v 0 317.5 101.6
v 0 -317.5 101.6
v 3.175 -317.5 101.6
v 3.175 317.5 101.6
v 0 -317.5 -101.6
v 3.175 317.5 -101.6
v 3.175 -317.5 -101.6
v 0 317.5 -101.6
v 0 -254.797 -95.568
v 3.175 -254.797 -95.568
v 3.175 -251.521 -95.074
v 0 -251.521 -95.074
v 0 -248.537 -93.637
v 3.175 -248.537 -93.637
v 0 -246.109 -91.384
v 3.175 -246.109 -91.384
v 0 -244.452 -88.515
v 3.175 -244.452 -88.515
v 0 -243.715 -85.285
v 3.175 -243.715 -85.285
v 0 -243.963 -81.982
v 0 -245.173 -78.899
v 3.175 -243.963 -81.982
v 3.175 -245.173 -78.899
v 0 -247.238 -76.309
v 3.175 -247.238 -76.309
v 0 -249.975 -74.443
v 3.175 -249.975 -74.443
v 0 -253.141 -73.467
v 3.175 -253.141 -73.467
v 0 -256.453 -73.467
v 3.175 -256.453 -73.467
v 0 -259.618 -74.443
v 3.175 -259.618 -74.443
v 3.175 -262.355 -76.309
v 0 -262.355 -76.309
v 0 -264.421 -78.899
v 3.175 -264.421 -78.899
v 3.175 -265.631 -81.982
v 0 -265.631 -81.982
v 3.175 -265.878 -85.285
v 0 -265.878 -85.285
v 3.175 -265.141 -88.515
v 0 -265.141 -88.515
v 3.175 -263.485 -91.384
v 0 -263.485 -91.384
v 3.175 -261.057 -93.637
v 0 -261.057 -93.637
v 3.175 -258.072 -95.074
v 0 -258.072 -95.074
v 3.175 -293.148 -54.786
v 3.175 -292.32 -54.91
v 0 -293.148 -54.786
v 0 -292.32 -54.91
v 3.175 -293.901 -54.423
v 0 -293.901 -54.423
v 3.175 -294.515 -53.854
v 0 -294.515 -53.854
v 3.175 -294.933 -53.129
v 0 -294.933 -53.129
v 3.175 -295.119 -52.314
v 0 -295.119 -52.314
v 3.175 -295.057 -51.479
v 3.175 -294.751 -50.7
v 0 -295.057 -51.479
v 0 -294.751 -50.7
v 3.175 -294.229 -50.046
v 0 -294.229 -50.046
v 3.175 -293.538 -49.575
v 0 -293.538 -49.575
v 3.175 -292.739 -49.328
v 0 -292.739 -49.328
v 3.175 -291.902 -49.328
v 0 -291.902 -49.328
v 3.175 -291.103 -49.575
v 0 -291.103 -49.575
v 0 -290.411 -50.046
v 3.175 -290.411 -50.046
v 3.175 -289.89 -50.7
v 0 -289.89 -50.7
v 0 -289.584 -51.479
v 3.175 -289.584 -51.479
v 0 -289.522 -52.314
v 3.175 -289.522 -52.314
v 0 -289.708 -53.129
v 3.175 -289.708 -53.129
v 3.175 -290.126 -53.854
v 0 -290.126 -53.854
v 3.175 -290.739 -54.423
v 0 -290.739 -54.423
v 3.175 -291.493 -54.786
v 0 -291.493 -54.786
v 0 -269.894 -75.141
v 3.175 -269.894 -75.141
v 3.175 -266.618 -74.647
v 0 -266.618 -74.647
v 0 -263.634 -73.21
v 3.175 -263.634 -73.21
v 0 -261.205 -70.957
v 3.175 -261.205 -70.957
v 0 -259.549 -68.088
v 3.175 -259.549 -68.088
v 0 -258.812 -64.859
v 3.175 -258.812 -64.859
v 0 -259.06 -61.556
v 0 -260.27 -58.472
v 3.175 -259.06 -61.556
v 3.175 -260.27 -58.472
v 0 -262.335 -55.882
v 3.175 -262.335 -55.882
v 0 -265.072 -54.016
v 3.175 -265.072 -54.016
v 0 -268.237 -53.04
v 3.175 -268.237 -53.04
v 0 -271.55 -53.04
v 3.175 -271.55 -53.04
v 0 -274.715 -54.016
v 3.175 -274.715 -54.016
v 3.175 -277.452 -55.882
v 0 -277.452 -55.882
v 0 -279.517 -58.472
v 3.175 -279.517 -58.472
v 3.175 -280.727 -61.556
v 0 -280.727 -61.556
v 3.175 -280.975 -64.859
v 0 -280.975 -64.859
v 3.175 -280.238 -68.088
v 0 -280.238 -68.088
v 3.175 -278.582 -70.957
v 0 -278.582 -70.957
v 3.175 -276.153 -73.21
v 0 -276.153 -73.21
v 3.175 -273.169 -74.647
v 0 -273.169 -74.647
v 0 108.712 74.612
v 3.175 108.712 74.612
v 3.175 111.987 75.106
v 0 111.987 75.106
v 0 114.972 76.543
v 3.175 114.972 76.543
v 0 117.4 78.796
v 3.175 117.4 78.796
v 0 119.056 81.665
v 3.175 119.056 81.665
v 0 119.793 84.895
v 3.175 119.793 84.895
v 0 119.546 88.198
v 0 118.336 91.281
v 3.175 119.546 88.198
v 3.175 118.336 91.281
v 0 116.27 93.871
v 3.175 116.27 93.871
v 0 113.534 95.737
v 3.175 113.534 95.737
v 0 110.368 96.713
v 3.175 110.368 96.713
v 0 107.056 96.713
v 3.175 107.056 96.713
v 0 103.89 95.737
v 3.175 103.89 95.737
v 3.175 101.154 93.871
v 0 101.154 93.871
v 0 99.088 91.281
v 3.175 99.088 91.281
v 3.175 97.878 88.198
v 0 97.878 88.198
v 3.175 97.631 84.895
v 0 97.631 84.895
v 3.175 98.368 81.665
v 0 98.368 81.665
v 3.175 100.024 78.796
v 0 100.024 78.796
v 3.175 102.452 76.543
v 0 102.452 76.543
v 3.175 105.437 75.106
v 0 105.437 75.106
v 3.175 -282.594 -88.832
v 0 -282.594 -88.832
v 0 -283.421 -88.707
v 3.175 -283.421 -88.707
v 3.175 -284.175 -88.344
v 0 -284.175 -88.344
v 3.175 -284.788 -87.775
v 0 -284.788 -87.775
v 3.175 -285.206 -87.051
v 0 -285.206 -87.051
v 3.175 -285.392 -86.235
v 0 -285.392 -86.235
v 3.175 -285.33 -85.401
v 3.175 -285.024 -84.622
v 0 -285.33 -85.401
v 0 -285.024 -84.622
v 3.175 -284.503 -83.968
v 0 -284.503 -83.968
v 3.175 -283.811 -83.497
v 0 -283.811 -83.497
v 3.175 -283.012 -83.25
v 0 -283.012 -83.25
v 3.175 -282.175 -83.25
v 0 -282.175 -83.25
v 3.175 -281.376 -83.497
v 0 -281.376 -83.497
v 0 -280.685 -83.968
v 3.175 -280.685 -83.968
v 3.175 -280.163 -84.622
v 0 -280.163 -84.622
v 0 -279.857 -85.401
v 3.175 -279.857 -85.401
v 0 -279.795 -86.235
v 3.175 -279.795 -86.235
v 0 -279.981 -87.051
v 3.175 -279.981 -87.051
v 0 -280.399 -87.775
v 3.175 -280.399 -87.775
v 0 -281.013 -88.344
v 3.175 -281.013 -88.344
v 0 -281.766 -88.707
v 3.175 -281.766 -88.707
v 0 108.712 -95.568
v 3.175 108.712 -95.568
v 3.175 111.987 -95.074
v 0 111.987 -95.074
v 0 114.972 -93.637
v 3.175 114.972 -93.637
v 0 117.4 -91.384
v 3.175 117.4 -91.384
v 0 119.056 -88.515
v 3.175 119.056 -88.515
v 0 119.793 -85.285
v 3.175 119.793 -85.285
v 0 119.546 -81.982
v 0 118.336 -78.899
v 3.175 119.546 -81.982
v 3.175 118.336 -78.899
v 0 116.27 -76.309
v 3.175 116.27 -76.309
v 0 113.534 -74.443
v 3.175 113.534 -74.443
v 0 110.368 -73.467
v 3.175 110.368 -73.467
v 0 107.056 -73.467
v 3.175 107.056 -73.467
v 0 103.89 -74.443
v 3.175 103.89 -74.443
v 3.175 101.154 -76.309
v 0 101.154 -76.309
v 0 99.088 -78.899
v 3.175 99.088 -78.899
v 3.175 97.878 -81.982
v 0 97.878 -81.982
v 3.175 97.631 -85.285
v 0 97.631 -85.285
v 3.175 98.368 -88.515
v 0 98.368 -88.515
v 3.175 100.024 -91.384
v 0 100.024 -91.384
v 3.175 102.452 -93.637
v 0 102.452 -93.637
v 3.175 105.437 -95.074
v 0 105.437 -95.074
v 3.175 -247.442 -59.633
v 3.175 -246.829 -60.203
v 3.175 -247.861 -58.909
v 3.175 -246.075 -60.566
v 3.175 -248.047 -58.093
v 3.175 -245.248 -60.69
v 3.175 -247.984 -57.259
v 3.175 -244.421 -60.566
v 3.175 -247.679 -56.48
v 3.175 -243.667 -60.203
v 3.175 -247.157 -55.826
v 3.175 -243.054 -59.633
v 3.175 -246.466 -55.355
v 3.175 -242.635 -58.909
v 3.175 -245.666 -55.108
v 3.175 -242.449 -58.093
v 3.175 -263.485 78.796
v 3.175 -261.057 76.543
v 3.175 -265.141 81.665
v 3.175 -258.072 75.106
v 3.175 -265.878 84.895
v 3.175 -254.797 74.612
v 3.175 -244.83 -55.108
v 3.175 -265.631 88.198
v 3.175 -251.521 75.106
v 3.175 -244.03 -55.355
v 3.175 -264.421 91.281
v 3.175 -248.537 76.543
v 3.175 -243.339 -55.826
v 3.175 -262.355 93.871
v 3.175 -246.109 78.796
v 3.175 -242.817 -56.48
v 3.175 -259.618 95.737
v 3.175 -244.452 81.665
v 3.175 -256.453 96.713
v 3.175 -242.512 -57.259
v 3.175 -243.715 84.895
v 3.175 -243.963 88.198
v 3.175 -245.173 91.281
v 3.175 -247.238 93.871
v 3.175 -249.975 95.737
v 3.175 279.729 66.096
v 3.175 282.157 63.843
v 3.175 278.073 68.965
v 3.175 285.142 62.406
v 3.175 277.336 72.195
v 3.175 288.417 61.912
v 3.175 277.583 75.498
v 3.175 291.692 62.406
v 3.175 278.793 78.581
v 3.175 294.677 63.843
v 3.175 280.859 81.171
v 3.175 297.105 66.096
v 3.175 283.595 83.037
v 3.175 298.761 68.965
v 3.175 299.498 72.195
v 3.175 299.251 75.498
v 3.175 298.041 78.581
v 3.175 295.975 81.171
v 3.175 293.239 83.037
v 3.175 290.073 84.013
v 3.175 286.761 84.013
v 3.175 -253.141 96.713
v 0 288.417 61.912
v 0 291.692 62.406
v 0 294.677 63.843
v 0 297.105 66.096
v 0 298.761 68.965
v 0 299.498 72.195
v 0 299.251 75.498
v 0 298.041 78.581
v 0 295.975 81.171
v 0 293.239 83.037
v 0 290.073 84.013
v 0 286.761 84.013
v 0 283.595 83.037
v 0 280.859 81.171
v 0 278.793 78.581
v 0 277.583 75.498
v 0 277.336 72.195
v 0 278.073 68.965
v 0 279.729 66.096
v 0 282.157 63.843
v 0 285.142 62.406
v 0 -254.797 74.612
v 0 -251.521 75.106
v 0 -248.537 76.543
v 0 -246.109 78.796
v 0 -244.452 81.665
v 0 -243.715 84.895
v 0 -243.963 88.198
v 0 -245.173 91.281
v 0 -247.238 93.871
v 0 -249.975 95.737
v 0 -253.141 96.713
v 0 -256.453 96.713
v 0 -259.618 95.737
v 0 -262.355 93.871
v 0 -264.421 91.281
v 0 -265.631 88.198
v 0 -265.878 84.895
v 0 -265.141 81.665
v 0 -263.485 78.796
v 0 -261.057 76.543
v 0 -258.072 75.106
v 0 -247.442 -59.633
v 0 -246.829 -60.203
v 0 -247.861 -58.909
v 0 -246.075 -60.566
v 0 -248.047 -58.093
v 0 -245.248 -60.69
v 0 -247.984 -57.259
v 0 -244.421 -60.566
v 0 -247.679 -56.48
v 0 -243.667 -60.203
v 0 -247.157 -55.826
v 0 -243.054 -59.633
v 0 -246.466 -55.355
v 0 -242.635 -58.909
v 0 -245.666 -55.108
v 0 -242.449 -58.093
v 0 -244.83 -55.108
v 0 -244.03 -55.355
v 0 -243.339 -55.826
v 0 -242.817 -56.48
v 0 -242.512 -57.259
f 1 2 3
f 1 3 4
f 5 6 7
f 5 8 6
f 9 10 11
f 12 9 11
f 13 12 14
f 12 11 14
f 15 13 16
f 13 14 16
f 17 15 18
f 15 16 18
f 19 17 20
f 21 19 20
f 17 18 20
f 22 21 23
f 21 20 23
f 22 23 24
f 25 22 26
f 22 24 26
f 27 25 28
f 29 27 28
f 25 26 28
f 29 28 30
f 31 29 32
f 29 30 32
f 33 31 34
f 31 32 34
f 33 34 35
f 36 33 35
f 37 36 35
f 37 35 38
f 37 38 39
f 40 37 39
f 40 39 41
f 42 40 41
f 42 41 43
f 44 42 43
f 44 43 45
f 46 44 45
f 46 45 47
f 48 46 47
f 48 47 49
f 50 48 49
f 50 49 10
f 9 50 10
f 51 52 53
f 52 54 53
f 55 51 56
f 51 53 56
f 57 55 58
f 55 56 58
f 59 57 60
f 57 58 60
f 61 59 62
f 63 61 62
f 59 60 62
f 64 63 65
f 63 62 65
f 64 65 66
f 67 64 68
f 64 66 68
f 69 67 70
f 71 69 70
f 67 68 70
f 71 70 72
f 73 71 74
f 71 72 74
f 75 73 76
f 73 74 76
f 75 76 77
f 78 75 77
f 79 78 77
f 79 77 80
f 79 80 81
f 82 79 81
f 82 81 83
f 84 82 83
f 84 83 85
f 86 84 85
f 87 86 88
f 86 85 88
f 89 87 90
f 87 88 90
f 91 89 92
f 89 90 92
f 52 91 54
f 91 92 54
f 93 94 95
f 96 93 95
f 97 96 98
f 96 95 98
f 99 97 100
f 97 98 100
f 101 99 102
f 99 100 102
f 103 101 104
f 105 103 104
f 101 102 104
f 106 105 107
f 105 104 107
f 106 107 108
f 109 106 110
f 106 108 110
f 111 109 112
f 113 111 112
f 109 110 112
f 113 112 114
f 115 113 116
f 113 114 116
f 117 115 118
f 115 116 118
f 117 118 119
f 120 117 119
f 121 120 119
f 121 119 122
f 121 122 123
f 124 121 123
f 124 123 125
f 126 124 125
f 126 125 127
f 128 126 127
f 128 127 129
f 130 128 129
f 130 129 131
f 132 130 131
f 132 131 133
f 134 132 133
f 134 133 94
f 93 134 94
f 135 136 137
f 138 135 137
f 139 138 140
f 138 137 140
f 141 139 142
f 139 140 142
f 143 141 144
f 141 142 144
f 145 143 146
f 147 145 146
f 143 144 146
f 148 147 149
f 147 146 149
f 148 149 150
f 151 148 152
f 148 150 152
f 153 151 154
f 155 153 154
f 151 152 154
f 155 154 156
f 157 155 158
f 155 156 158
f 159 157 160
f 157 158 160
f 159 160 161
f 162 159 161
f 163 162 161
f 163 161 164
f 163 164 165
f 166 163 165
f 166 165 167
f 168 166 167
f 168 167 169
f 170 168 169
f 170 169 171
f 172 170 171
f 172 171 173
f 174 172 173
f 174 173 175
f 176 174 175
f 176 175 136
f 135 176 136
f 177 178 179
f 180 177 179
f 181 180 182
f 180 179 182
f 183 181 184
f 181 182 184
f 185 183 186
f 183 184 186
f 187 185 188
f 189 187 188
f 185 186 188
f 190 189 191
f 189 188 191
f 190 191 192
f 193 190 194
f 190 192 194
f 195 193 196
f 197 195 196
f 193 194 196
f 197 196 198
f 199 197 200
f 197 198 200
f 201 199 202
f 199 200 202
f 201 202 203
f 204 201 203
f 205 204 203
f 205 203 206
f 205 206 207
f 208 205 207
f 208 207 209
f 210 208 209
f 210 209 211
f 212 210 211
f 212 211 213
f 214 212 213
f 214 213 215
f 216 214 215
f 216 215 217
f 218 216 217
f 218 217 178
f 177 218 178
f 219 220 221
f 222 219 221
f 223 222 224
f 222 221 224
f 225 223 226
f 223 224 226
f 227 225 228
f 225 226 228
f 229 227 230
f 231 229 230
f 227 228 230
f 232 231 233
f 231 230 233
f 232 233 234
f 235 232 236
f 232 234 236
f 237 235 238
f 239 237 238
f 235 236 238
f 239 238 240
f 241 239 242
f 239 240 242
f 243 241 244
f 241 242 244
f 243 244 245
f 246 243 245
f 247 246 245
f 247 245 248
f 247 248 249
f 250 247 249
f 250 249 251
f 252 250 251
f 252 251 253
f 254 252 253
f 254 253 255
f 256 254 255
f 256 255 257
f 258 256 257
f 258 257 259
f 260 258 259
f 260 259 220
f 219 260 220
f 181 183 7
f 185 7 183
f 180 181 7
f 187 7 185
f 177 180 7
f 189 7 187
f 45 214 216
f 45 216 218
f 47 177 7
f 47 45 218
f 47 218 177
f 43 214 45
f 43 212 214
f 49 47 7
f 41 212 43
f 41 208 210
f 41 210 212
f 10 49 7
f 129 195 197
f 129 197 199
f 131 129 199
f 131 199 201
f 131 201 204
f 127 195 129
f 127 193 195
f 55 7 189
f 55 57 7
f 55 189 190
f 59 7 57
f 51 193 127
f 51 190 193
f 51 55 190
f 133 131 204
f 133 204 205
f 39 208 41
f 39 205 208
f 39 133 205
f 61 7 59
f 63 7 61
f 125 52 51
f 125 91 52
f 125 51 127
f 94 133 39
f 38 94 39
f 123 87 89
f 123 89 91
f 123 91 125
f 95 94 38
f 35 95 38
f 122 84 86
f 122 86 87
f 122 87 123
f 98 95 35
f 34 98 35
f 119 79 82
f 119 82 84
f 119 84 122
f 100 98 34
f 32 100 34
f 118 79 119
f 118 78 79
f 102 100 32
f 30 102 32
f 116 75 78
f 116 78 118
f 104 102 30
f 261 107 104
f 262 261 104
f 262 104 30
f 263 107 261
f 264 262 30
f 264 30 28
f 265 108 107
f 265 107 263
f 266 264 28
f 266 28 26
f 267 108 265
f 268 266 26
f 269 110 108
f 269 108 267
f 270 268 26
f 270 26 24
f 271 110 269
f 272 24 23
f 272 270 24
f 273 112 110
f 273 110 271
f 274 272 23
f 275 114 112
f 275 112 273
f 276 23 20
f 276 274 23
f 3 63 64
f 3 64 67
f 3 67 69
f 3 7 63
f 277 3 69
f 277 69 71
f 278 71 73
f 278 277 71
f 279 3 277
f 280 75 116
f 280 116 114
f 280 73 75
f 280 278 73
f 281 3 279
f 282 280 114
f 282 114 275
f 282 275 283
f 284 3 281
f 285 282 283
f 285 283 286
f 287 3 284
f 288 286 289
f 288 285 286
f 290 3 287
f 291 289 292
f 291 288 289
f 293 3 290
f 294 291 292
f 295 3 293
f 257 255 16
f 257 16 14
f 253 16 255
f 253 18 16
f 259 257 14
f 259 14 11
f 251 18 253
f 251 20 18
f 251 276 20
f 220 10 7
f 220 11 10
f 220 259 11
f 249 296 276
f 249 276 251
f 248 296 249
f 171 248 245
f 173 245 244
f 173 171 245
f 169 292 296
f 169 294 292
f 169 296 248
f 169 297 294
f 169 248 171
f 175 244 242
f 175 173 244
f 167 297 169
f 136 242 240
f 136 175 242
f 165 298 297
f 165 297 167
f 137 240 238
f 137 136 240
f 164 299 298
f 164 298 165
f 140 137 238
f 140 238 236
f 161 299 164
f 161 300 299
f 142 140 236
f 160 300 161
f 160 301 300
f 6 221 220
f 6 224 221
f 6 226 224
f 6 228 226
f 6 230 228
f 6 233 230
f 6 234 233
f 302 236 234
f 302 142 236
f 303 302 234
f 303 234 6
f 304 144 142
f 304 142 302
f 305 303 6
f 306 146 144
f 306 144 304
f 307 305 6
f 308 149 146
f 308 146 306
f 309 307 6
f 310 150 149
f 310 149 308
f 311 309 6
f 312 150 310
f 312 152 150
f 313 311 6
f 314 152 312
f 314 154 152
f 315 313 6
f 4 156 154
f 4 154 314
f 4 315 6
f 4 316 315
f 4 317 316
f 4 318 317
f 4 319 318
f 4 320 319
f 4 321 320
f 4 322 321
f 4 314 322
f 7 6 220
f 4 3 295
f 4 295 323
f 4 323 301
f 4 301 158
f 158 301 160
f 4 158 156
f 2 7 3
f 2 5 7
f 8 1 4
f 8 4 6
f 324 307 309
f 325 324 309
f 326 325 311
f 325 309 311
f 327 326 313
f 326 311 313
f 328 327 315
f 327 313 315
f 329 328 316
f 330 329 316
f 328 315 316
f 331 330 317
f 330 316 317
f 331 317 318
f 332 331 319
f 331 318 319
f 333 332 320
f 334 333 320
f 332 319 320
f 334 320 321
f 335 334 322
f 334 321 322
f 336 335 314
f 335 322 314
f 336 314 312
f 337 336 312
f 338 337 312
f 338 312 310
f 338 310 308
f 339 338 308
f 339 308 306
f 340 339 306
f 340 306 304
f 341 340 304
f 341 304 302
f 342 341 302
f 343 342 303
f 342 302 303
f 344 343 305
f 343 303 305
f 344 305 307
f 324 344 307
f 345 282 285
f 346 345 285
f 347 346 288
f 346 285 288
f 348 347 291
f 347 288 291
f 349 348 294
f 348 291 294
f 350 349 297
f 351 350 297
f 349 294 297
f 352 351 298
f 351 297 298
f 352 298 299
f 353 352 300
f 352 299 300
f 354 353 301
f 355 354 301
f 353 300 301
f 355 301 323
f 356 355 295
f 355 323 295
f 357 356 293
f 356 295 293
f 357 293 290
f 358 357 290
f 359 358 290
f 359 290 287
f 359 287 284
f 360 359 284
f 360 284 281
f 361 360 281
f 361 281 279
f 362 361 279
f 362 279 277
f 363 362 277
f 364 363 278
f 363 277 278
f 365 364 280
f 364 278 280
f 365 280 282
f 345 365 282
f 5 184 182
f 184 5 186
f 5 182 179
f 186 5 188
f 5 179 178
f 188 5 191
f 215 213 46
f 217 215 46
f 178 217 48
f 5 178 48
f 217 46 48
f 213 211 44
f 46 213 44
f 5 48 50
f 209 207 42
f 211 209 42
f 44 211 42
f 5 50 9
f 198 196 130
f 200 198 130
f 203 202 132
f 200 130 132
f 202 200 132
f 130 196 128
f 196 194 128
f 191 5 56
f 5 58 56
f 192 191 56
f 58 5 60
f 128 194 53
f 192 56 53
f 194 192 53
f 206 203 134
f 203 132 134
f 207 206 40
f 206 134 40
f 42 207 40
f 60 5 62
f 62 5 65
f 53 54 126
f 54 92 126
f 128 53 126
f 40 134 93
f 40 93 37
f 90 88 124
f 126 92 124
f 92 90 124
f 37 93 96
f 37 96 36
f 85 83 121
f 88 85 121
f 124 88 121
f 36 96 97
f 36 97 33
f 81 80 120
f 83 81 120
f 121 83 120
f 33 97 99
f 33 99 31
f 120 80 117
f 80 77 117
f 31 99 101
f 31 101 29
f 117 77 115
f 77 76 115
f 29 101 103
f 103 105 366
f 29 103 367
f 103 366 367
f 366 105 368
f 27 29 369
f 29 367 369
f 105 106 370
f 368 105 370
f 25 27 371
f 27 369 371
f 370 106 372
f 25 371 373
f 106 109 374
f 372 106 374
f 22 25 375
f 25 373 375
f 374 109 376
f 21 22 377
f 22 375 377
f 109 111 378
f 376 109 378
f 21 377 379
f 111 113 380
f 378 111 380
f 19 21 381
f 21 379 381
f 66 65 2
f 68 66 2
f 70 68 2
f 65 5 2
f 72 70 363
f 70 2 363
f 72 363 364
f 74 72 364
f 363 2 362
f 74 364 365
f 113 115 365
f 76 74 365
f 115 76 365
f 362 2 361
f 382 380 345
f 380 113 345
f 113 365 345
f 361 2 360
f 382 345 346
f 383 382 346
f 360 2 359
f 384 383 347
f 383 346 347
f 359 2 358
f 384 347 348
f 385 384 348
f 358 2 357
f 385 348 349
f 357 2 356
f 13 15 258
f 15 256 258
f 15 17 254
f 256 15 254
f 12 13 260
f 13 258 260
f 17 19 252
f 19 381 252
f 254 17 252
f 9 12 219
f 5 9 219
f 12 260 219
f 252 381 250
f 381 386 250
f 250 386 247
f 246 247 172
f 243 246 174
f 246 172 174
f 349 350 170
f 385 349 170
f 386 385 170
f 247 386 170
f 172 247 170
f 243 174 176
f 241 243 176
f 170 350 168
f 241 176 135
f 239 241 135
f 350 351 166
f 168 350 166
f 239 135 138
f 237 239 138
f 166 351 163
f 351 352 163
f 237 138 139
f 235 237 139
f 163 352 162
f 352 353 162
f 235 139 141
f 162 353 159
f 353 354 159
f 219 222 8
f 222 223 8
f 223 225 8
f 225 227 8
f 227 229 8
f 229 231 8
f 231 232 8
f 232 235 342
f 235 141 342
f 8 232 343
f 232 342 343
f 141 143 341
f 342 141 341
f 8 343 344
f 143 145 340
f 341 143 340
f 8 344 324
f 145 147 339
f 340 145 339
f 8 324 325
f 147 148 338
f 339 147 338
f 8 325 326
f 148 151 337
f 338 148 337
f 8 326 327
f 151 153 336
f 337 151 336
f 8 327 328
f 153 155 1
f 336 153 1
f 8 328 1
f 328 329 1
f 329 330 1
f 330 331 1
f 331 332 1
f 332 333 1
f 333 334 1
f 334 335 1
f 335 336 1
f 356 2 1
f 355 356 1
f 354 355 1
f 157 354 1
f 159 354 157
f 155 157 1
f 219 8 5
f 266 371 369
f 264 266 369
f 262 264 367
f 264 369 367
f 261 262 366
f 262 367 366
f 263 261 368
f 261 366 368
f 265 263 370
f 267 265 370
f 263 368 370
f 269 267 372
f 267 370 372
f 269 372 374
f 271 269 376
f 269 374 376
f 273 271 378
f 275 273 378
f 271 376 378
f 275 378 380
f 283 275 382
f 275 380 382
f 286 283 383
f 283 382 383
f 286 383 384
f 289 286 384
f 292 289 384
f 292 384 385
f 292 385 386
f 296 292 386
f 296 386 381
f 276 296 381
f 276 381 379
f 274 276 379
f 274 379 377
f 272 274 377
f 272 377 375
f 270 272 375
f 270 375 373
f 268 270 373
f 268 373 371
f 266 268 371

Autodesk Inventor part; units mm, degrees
ref_plane "YZ Plane" through (0, 0, 0) normal (1, 0, 0) x (0, 1, 0)
ref_plane "XZ Plane" through (0, 0, 0) normal (0, 1, 0) x (-1, 0, 0)
ref_plane "XY Plane" through (0, 0, 0) normal (0, 0, 1) x (1, 0, 0)
sketch "Sketch1" plane through (0, 0, 0) normal (1, 0, 0) x (0, 1, 0)
  line L0 (-317.5, 101.6) -> (317.5, 101.6)
  line L1 (317.5, 101.6) -> (317.5, -101.6)
  line L2 (317.5, -101.6) -> (-317.5, -101.6)
  line L3 (-317.5, -101.6) -> (-317.5, 101.6)
  line L4 (-317.5, 101.6) -> (317.5, -101.6) construction
  line L5 (317.5, 101.6) -> (-317.5, -101.6) construction
  point P0 (0, 0)
  dimension "d0" = 635
  dimension "d1" = 203.2
extrude "Plate1" add sketch "Sketch1" along normal blind 3.175
sketch "Sketch2" plane through (3.175, 0, 0) normal (1, 0, 0) x (0, 0, -1)
  circle A0 centre (-85.725, -254.7968) radius 11.1125
  circle A1 centre (84.455, -254.7968) radius 11.1125
  circle A2 centre (-85.725, 108.712) radius 11.1125
  circle A3 centre (84.455, 108.712) radius 11.1125
  circle A4 centre (-85.725, -254.7968) radius 11.938 construction
  circle A5 centre (84.455, -254.7968) radius 11.938 construction
  circle A6 centre (84.455, 108.712) radius 11.938 construction
  circle A7 centre (-85.725, 108.712) radius 11.938 construction
  line L0 (-101.6, -317.5) -> (-101.6, 317.5) projected
  circle A8 centre (64.0284, -269.8936) radius 12.7 construction
  circle A9 centre (64.0284, -269.8936) radius 11.1125
  point P0 (0, 0)
  point P1 (-138.1252, 190.5)
  dimension "d3" = 22.225
  dimension "d6" = 23.876
  dimension "d7" = 170.18
  dimension "d8" = 15.875
  dimension "d9" = 363.5088
  dimension "d10" = 81.788
  dimension "d11" = 25.4
  dimension "d12" = 25.4
  dimension "d13" = 150.5124
extrude "Cut1" cut sketch "Sketch2" against normal blind 3.175
sketch "Sketch3" plane through (3.175, 0, 0) normal (1, 0, 0) x (0, 0, -1)
  line L0 (-101.6, 269.875) -> (-101.6, 111.125) projected
  circle A0 centre (-73.025, 288.417) radius 11.1125
  point P0 (0, 0)
  point P1 (-101.6, 190.5)
  dimension "d16" = 22.225
  dimension "d17" = 97.917
  dimension "d18" = 28.575
extrude "Cut2" cut sketch "Sketch3" against normal blind 3.175
sketch "Sketch4" plane through (3.175, 0, 0) normal (1, 0, 0) x (0, 0, -1)
  circle A0 centre (64.0284, -269.8936) radius 11.1125 construction
  line L0 (64.0284, -269.8936) -> (57.8835, -245.2481) construction
  line L1 (64.0284, -269.8936) -> (52.1038, -292.3204) construction
  line L2 (64.0284, -269.8936) -> (86.0254, -282.5936) construction
  line L3 (64.0284, -269.8936) -> (64.0284, -241.3632) construction
  point P0 (0, 0)
  dimension "d21" = 25.4
  dimension "d22" = 14
  dimension "d23" = 28
  dimension "d24" = 60
hole "Hole1" at (3.175, -245.2481, -57.8835) at (3.175, -292.3204, -52.1038) at (3.175, -282.5936, -86.0254) direction (-1, 0, 0) diameter 5.6134 depth 3.175 tip angle 118 clearance for "Flat Head Machine Screw (82)" size "#10" standard "Ansi Unified Screw Threads"
equation "\"d14\" = Thickness"
equation "\"d19\" = Thickness"
equation "\"d30\" = Thickness"
equation "\"d2\" = Thickness"
equation "\"BendRadius\" = Thickness"
equation "\"BendReliefWidth\" = Thickness"
equation "\"BendReliefDepth\" = 0.5 * Thickness"
equation "\"CornerReliefSize\" = 4 * Thickness"
equation "\"MinimumRemnant\" = 2 * Thickness"
equation "\"TransitionRadius\" = BendRadius"
equation "\"JacobiRadiusSize\" = BendRadius"
equation "\"GapSize\" = Thickness"
equation "\"Thickness\" = 3.175"
properties part number "PLATE,BACK" material "Aluminum 6061"
